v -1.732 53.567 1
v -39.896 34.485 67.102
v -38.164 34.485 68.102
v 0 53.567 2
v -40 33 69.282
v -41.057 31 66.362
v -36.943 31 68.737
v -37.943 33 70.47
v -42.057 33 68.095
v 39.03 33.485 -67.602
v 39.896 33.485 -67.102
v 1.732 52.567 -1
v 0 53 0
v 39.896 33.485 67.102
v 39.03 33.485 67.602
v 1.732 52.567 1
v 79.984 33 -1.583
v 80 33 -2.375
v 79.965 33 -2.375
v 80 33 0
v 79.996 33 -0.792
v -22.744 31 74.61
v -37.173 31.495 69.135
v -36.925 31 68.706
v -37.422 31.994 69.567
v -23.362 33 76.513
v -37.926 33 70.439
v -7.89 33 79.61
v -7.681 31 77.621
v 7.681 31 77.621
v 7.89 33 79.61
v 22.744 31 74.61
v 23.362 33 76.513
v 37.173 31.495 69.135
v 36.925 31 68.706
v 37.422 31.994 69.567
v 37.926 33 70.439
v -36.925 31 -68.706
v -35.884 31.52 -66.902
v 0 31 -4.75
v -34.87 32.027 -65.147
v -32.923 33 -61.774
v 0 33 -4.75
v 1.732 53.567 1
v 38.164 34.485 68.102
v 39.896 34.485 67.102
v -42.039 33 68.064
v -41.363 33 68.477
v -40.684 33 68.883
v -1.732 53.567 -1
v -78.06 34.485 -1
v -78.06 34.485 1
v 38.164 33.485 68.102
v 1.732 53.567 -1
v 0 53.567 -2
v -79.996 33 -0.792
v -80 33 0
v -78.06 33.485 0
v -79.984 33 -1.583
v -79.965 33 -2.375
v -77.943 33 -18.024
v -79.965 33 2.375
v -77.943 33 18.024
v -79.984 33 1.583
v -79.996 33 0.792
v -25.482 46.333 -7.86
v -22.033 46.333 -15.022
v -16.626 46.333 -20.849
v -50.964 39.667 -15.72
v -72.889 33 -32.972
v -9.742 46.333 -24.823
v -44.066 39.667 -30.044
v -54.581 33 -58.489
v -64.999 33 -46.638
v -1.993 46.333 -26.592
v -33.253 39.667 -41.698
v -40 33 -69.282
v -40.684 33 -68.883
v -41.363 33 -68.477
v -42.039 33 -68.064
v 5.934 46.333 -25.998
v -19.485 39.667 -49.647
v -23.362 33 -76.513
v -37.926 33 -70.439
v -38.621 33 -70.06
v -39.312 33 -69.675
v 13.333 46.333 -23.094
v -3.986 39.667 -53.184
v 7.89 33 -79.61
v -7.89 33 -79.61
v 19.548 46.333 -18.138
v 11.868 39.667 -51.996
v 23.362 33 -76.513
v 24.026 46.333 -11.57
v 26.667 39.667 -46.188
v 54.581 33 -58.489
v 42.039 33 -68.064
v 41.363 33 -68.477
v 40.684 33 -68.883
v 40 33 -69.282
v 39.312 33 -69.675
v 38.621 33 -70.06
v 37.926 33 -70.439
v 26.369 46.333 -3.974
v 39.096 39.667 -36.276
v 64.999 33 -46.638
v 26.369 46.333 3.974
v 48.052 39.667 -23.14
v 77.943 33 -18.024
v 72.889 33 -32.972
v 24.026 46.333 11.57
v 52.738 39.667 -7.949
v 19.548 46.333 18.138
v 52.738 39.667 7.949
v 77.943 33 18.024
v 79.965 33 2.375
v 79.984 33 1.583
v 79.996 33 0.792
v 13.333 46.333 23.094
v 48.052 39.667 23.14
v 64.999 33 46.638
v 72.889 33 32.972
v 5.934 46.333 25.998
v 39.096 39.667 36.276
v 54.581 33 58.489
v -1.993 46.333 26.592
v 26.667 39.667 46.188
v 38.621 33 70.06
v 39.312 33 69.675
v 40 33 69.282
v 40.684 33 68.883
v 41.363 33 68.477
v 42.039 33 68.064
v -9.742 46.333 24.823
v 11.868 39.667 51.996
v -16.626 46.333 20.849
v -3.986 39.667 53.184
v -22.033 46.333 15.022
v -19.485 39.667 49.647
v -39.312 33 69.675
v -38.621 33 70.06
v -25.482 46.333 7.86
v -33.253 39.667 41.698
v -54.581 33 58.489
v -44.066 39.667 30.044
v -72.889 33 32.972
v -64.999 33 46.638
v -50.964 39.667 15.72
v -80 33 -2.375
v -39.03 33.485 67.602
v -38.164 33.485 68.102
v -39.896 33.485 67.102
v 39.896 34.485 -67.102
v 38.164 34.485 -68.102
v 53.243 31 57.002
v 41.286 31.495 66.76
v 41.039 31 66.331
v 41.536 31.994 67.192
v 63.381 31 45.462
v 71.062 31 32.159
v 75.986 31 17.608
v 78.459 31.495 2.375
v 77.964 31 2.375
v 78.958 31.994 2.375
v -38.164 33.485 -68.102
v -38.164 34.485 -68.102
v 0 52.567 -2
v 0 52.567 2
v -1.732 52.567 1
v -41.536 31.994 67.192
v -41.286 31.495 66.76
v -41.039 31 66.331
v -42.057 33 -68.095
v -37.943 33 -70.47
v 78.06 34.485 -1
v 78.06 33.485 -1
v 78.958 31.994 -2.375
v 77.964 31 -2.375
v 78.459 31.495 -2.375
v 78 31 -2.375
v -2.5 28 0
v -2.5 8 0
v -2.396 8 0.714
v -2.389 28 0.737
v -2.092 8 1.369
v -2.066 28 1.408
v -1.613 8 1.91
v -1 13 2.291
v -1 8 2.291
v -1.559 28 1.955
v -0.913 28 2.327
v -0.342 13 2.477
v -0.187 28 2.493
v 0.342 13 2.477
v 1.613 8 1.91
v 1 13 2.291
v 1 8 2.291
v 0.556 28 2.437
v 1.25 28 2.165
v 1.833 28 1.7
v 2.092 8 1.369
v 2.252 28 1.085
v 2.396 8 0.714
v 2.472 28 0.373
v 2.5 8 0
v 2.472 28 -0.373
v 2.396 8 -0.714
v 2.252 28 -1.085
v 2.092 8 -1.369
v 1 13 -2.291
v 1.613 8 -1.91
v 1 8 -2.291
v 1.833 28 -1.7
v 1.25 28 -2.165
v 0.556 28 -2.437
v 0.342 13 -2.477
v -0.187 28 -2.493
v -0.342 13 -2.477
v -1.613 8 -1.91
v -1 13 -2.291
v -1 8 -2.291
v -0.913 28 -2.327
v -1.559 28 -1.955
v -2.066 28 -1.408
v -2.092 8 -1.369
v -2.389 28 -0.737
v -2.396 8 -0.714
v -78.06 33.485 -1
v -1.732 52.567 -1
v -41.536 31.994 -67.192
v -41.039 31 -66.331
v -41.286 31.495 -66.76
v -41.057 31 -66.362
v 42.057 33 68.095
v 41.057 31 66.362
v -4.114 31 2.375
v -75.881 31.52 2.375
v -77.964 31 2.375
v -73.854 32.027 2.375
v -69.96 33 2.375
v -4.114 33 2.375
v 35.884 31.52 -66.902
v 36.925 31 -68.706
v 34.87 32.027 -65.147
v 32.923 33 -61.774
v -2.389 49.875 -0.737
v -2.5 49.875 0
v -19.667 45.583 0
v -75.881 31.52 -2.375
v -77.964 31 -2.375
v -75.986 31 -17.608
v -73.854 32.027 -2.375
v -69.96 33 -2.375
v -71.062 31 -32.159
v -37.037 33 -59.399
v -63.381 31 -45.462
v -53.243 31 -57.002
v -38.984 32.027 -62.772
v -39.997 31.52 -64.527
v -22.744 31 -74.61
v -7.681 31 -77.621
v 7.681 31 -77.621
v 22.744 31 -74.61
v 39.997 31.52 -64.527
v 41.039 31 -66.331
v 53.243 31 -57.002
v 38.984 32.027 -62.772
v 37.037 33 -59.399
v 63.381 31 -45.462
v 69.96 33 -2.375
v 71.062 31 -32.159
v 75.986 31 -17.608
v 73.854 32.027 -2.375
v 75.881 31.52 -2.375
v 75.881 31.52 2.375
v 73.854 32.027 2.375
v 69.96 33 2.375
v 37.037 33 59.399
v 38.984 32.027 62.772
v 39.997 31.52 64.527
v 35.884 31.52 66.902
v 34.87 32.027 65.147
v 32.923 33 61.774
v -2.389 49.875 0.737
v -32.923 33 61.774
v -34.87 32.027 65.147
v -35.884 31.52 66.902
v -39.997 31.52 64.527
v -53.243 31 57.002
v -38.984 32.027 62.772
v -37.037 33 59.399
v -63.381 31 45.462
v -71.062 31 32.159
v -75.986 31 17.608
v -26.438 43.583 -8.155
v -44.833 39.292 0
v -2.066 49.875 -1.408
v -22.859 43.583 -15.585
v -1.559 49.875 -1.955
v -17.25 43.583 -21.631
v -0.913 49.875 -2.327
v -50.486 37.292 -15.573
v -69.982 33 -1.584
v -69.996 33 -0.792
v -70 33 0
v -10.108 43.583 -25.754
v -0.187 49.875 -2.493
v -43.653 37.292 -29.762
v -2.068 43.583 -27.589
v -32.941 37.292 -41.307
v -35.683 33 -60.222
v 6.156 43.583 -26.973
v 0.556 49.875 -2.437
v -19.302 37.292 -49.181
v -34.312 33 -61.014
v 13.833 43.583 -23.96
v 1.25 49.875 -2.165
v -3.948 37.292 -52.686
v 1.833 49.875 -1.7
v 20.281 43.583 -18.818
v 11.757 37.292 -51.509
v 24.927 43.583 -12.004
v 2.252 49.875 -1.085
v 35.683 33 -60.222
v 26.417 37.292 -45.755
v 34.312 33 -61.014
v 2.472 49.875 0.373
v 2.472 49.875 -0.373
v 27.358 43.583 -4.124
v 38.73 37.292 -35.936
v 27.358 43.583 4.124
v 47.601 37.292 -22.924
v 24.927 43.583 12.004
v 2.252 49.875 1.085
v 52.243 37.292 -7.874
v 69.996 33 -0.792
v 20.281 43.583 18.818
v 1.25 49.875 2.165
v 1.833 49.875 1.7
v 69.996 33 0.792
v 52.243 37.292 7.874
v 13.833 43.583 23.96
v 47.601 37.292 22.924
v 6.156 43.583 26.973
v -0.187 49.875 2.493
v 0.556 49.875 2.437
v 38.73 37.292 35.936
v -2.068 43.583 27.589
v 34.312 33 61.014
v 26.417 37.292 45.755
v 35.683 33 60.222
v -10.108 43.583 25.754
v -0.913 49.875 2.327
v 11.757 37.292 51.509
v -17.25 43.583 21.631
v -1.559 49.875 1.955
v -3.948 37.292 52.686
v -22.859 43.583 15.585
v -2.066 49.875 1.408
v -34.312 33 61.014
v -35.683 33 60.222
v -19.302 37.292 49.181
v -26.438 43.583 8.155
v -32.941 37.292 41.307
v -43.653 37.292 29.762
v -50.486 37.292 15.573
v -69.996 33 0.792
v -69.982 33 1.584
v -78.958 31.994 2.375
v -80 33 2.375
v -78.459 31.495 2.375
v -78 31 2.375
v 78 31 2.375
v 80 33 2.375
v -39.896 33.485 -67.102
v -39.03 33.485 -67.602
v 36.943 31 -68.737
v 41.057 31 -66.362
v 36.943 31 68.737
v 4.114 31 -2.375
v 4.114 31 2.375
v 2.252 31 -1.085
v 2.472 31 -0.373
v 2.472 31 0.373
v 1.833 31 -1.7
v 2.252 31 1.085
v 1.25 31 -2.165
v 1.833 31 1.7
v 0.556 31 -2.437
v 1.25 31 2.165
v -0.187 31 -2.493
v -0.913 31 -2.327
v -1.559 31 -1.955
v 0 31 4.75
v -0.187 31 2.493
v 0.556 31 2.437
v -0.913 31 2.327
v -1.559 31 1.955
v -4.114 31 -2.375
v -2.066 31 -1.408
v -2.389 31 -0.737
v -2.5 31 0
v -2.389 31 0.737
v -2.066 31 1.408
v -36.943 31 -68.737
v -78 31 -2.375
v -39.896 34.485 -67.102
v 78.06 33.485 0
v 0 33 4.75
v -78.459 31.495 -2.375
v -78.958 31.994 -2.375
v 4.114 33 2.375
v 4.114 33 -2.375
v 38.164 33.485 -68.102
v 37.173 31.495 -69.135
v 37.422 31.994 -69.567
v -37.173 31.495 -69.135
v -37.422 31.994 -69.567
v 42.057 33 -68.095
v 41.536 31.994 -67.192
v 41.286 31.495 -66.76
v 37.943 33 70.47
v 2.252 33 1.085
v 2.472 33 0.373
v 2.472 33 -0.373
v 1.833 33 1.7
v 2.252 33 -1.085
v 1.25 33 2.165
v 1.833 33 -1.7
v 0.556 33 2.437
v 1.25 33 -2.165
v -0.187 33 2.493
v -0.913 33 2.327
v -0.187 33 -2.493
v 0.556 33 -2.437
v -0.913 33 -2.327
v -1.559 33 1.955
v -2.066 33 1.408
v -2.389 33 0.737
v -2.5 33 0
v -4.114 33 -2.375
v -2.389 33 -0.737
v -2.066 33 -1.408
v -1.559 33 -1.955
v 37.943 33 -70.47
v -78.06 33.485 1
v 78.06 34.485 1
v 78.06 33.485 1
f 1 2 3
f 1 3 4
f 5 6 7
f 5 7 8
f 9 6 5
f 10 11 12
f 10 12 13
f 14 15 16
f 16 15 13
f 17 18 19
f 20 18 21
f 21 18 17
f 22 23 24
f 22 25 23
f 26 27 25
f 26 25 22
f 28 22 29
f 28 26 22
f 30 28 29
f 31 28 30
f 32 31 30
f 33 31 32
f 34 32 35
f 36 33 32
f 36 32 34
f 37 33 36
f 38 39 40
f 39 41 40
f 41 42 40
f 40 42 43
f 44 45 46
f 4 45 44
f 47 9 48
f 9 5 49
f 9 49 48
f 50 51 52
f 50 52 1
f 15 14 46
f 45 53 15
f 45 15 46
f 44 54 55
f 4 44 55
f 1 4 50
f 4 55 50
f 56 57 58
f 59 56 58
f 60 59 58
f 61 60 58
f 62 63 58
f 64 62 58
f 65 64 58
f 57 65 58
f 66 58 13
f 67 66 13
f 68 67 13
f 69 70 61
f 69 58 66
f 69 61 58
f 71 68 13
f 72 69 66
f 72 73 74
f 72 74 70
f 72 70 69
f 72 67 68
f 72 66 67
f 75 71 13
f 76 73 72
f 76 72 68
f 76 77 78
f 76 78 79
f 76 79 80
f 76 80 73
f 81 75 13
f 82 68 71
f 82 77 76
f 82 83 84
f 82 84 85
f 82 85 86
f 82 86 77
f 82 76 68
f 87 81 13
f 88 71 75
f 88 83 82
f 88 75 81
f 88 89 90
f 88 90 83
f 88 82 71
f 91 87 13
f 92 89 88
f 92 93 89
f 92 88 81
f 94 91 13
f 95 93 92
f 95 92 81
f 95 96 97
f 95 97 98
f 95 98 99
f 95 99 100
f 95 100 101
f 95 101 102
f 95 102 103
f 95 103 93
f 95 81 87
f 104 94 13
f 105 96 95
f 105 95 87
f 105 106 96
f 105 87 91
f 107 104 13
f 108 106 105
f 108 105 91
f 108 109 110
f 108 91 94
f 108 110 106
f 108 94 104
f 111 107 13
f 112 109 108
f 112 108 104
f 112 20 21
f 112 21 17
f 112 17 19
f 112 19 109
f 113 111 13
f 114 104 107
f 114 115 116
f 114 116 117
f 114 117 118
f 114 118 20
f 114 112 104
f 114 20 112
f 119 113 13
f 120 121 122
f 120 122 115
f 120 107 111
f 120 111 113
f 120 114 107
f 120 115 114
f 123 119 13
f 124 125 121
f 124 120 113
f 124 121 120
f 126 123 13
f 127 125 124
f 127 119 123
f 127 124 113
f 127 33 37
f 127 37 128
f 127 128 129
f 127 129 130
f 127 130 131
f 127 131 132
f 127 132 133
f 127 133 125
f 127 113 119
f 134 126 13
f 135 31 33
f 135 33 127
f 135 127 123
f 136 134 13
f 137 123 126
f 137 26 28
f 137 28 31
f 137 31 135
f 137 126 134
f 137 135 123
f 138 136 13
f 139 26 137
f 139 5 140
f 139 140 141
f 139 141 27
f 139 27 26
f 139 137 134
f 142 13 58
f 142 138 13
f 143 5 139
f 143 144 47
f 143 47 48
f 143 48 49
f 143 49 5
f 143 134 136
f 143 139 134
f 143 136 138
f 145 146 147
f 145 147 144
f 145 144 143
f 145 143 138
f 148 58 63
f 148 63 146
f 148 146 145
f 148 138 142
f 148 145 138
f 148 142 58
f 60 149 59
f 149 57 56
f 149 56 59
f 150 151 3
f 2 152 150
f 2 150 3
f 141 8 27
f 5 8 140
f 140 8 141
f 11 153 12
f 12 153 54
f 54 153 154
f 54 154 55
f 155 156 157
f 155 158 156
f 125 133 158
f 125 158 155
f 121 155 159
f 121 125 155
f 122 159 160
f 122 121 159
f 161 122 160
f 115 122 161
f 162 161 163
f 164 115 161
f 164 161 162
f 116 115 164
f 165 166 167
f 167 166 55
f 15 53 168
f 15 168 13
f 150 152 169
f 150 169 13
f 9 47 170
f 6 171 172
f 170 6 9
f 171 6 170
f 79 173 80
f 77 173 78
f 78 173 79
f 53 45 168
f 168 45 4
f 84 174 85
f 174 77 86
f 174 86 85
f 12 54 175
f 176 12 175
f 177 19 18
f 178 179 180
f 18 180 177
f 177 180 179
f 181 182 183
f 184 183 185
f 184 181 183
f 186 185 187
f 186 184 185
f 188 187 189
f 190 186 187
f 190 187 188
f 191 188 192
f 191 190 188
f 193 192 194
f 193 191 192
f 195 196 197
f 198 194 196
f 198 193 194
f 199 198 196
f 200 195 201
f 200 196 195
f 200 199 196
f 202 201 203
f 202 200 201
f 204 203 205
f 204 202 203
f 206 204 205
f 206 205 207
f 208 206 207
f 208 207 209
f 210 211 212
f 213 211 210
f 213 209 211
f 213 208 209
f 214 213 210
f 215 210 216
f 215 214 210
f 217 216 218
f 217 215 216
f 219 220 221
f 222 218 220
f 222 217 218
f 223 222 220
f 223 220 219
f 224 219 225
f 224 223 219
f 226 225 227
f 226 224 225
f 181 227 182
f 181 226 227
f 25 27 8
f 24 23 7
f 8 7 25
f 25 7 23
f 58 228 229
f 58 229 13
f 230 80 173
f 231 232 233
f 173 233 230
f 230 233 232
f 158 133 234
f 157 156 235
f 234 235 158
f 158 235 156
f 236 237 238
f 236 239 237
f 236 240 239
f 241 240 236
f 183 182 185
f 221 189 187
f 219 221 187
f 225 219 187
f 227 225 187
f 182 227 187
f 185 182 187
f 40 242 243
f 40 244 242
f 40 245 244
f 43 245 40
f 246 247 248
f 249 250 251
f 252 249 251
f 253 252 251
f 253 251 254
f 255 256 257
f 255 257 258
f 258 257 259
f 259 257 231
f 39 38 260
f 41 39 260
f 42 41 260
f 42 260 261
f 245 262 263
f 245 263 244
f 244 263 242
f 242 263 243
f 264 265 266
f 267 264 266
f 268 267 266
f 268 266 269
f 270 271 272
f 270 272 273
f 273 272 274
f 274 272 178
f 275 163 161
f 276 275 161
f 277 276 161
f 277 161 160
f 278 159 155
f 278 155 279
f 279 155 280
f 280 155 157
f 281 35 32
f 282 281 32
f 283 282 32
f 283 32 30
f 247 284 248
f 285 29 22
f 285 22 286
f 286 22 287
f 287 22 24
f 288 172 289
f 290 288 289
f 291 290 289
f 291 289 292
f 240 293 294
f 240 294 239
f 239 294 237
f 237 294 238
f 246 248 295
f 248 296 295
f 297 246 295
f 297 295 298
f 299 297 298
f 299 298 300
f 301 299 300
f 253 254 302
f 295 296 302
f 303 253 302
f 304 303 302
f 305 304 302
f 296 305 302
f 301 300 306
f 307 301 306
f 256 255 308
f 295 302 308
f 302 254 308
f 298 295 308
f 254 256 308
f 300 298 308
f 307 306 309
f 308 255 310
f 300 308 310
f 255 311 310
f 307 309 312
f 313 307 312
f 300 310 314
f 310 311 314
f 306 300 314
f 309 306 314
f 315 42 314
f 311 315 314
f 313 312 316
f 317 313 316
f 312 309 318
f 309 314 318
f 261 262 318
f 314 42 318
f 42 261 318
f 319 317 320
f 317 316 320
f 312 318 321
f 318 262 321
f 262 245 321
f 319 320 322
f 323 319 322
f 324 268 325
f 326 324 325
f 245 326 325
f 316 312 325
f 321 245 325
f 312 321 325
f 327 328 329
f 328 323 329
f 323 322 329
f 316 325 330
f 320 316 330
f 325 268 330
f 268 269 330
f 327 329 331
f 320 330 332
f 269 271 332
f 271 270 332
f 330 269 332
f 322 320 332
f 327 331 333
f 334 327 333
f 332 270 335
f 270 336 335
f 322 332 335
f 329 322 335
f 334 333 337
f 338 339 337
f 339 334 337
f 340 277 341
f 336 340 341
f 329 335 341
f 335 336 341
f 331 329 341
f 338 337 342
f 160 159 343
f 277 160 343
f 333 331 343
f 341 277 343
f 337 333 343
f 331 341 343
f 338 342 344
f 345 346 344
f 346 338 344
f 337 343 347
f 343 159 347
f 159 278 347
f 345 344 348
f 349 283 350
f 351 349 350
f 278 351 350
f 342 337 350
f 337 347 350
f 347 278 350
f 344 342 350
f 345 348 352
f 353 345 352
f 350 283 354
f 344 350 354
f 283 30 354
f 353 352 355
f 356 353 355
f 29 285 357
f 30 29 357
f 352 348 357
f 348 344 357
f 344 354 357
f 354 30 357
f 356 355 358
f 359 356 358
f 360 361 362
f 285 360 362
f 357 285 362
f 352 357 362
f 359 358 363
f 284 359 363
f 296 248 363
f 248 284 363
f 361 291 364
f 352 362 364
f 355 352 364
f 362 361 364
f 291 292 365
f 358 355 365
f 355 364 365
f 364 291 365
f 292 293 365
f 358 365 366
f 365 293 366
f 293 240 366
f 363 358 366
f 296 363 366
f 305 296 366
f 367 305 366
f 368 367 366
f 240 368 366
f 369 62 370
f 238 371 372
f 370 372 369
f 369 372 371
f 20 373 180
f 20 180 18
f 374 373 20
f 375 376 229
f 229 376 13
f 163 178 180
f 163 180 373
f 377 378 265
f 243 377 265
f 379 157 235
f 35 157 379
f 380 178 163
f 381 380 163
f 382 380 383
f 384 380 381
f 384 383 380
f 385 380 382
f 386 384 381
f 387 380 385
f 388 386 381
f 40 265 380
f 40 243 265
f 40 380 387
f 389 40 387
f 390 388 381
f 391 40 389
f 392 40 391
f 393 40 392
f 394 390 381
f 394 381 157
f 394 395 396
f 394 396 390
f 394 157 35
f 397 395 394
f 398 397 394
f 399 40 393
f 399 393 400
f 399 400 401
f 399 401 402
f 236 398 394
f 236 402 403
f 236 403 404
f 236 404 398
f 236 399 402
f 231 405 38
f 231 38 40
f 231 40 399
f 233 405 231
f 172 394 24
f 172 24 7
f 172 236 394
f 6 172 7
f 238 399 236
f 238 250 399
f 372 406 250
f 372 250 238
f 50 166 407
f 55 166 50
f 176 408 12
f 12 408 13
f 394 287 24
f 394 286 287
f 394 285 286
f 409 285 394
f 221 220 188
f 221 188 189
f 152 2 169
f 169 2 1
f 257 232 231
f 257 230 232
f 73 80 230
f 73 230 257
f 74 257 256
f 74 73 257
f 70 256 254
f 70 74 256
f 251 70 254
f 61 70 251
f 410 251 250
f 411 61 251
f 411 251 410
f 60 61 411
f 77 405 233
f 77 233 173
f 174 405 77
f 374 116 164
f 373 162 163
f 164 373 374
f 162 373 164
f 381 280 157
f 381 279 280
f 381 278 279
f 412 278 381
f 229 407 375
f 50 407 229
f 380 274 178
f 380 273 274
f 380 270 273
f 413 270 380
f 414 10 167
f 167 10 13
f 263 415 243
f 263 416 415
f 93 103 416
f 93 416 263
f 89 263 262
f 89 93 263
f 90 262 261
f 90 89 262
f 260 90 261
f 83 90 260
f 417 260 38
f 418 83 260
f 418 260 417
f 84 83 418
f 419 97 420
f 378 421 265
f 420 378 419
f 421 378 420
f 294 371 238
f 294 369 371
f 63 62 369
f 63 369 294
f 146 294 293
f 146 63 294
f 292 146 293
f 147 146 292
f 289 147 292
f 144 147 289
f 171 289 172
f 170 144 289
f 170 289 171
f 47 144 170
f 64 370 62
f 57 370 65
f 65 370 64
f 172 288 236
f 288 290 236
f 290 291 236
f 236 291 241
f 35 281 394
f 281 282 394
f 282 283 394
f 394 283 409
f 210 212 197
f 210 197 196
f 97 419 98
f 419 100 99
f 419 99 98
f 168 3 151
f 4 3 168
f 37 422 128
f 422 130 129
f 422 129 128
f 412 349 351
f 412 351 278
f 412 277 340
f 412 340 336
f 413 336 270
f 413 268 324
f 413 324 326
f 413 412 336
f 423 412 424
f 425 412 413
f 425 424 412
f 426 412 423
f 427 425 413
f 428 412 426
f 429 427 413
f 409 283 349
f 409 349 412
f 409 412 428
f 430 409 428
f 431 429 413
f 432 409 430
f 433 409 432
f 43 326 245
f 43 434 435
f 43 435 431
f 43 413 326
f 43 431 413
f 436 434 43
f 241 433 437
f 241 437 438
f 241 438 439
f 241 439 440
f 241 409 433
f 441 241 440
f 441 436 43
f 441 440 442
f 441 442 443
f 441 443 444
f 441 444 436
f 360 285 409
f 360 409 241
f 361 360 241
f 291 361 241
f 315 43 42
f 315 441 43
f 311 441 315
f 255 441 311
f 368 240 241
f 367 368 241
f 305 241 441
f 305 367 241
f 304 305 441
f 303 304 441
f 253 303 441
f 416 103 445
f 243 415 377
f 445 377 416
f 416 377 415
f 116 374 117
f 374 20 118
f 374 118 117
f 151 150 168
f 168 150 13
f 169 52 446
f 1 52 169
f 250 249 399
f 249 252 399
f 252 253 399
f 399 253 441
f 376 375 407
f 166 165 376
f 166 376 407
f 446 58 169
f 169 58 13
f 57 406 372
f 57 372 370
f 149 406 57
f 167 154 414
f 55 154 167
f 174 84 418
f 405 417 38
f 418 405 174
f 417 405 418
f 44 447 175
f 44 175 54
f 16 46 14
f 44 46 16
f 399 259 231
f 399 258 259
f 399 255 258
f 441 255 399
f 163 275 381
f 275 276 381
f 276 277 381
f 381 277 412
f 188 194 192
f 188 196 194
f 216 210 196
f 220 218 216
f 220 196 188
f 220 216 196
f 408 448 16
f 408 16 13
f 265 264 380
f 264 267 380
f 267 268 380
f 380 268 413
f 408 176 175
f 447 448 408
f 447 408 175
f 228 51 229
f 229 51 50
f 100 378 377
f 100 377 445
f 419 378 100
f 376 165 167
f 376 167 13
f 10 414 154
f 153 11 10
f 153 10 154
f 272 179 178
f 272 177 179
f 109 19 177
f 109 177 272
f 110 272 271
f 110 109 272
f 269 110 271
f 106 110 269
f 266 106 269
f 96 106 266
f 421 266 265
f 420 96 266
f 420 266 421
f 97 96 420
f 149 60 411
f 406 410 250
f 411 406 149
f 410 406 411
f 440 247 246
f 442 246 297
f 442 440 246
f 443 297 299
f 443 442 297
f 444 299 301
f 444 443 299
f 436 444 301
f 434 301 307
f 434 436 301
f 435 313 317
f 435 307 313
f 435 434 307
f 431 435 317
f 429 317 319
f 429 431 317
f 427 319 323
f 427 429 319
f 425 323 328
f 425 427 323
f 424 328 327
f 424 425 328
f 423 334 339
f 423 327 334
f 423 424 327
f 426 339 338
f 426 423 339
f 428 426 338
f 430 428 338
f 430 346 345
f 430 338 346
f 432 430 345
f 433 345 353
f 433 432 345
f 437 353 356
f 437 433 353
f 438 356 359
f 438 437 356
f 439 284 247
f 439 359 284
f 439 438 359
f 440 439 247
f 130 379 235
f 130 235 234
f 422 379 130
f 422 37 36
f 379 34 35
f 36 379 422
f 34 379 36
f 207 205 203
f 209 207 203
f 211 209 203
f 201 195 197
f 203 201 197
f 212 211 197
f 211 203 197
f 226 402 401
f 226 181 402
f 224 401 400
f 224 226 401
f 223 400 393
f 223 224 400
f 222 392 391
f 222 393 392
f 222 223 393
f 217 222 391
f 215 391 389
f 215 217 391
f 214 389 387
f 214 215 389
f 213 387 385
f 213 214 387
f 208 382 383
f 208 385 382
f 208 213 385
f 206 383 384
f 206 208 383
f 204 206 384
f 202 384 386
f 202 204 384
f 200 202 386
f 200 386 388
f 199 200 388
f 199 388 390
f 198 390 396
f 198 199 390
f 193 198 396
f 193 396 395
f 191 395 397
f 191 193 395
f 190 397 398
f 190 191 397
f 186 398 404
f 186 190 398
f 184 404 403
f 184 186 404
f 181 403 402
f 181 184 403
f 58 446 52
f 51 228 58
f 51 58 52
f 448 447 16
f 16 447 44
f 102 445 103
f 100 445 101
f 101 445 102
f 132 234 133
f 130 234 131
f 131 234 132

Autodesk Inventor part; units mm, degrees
ref_plane "YZ Plane" through (0, 0, 0) normal (1, 0, 0) x (0, 1, 0)
ref_plane "XZ Plane" through (0, 0, 0) normal (0, 1, 0) x (-1, 0, 0)
ref_plane "XY Plane" through (0, 0, 0) normal (0, 0, 1) x (1, 0, 0)
sketch "Sketch1" plane through (0, 0, 0) normal (0, 0, 1) x (1, 0, 0)
  line L0 (-80, 33) -> (0, 53)
  line L1 (-80, 33) -> (-80, 28)
  line L2 (0, 53) -> (0, 48)
  line L3 (0, 48) -> (-80, 28)
  line L4 (0, 53) -> (0, 48)
  line L5 (0, -10.6) -> (0, 63.6) projected
  line L6 (0, 53) -> (-2.5, 53)
  line L7 (-2.5, 53) -> (-2.5, 28)
  line L8 (-2.5, 28) -> (0, 28)
  line L9 (0, 28) -> (0, 53)
  line L10 (-80, 30.5) -> (0, 50.5)
  line L11 (-2.5, 28) -> (0, 28)
  line L12 (0, 28) -> (0, 8)
  line L13 (0, 8) -> (-2.5, 8)
  line L14 (-2.5, 8) -> (-2.5, 28)
  line L15 (-80, 30.5) -> (-78, 28.5)
  line L16 (-80, 30.5) -> (-77.1716, 30.5) construction
  line L17 (-80, 33) -> (-78, 31)
  line L18 (-80, 33) -> (-77.1716, 33) construction
  point P0 (0, 0)
  point P1 (-2.5, 47.375)
  point P2 (-2.5, 49.875)
  dimension "d2" = 5
  dimension "d3" = 5
  dimension "d5" = 2.5
  dimension "d11" = 20
  dimension "d24" = 45
  dimension "d25" = 45
revolve "Revolution1" add sketch "Sketch1" angle 360 about axis through (0, -10, 0) along (0, 1, 0) contours L0 L7 L10 L17 | L0 L2 L10 L7 | L10 L2 L3 L7 | L3 L5 L8 L7 | L8 L5 L13 L14
sketch "Sketch3" plane through (0, 0, 0) normal (0, 0, 1) x (1, 0, 0)
  line L0 (-1, 3) -> (1, 3)
  line L1 (1, 3) -> (1, 13)
  line L2 (1, 13) -> (-1, 13)
  line L3 (-1, 13) -> (-1, 3)
  line L4 (2.5, 8) -> (-2.5, 8) projected
  line L5 (-1, 3) -> (1, 13) construction
  line L6 (1, 3) -> (-1, 13) construction
  point P0 (0, 0)
  point P1 (0, 8)
extrude "Extrusion2" cut sketch "Sketch3" along normal mid plane 16.75
sketch "Sketch4" plane through (0, 0, 0) normal (0, 0, 1) x (1, 0, 0)
  line L0 (-80, 33) -> (0, 53) projected
  line L1 (0, 53) -> (-80, 33)
  line L2 (0, 53) -> (0, 55)
  line L3 (0, 55) -> (-80, 35)
  line L4 (-80, 35) -> (-80, 33)
  line L5 (-80, 33) -> (-78.0597, 33.4851)
  line L6 (-78.0597, 33.4851) -> (-78.0597, 35.4851)
  line L7 (-80, 34) -> (0, 54)
  point P0 (0, 0)
  point P1 (-78.0597, 34.4851)
  dimension "d14" = 2
  dimension "d15" = 2
extrude "Extrusion3" add sketch "Sketch4" along normal mid plane 2 contours L6 L7 L2 L0
pattern_circular "Circular Pattern2" count 6 over 360 about axis through (0, -10, 0) along (0, 1, 0) of "Extrusion3"
sketch "Sketch5" plane through (0, 0, 0) normal (0, 0, 1) x (1, 0, 0)
  line L0 (-3.2364, 54.433) -> (3.2364, 54.433)
  line L1 (3.2364, 54.433) -> (3.2364, 53.567)
  line L2 (3.2364, 53.567) -> (-3.2364, 53.567)
  line L3 (-3.2364, 53.567) -> (-3.2364, 54.433)
  line L4 (0, 54) -> (0.5774, 53.8557) projected
  line L5 (-3.2364, 54.433) -> (3.2364, 53.567) construction
  line L6 (3.2364, 54.433) -> (-3.2364, 53.567) construction
  point P0 (0, 0)
extrude "Extrusion4" cut sketch "Sketch5" along normal mid plane 4.75
sketch "Sketch6" plane through (0, 0, 0) normal (0, 0, 1) x (1, 0, 0)
  line L0 (-78, 31) -> (-80, 33) projected
  line L1 (-80, 33) -> (0, 33)
  line L2 (78, 31) -> (-78, 31) projected
  line L3 (0, 33) -> (0, 31)
  line L4 (-78, 31) -> (0, 31)
  point P0 (0, 0)
extrude "Extrusion5" add sketch "Sketch6" along normal mid plane 4.75
pattern_circular "Circular Pattern3" count 6 over 360 about axis through (0, -10, 0) along (0, 1, 0) of "Extrusion5"
properties part number "central disk"
